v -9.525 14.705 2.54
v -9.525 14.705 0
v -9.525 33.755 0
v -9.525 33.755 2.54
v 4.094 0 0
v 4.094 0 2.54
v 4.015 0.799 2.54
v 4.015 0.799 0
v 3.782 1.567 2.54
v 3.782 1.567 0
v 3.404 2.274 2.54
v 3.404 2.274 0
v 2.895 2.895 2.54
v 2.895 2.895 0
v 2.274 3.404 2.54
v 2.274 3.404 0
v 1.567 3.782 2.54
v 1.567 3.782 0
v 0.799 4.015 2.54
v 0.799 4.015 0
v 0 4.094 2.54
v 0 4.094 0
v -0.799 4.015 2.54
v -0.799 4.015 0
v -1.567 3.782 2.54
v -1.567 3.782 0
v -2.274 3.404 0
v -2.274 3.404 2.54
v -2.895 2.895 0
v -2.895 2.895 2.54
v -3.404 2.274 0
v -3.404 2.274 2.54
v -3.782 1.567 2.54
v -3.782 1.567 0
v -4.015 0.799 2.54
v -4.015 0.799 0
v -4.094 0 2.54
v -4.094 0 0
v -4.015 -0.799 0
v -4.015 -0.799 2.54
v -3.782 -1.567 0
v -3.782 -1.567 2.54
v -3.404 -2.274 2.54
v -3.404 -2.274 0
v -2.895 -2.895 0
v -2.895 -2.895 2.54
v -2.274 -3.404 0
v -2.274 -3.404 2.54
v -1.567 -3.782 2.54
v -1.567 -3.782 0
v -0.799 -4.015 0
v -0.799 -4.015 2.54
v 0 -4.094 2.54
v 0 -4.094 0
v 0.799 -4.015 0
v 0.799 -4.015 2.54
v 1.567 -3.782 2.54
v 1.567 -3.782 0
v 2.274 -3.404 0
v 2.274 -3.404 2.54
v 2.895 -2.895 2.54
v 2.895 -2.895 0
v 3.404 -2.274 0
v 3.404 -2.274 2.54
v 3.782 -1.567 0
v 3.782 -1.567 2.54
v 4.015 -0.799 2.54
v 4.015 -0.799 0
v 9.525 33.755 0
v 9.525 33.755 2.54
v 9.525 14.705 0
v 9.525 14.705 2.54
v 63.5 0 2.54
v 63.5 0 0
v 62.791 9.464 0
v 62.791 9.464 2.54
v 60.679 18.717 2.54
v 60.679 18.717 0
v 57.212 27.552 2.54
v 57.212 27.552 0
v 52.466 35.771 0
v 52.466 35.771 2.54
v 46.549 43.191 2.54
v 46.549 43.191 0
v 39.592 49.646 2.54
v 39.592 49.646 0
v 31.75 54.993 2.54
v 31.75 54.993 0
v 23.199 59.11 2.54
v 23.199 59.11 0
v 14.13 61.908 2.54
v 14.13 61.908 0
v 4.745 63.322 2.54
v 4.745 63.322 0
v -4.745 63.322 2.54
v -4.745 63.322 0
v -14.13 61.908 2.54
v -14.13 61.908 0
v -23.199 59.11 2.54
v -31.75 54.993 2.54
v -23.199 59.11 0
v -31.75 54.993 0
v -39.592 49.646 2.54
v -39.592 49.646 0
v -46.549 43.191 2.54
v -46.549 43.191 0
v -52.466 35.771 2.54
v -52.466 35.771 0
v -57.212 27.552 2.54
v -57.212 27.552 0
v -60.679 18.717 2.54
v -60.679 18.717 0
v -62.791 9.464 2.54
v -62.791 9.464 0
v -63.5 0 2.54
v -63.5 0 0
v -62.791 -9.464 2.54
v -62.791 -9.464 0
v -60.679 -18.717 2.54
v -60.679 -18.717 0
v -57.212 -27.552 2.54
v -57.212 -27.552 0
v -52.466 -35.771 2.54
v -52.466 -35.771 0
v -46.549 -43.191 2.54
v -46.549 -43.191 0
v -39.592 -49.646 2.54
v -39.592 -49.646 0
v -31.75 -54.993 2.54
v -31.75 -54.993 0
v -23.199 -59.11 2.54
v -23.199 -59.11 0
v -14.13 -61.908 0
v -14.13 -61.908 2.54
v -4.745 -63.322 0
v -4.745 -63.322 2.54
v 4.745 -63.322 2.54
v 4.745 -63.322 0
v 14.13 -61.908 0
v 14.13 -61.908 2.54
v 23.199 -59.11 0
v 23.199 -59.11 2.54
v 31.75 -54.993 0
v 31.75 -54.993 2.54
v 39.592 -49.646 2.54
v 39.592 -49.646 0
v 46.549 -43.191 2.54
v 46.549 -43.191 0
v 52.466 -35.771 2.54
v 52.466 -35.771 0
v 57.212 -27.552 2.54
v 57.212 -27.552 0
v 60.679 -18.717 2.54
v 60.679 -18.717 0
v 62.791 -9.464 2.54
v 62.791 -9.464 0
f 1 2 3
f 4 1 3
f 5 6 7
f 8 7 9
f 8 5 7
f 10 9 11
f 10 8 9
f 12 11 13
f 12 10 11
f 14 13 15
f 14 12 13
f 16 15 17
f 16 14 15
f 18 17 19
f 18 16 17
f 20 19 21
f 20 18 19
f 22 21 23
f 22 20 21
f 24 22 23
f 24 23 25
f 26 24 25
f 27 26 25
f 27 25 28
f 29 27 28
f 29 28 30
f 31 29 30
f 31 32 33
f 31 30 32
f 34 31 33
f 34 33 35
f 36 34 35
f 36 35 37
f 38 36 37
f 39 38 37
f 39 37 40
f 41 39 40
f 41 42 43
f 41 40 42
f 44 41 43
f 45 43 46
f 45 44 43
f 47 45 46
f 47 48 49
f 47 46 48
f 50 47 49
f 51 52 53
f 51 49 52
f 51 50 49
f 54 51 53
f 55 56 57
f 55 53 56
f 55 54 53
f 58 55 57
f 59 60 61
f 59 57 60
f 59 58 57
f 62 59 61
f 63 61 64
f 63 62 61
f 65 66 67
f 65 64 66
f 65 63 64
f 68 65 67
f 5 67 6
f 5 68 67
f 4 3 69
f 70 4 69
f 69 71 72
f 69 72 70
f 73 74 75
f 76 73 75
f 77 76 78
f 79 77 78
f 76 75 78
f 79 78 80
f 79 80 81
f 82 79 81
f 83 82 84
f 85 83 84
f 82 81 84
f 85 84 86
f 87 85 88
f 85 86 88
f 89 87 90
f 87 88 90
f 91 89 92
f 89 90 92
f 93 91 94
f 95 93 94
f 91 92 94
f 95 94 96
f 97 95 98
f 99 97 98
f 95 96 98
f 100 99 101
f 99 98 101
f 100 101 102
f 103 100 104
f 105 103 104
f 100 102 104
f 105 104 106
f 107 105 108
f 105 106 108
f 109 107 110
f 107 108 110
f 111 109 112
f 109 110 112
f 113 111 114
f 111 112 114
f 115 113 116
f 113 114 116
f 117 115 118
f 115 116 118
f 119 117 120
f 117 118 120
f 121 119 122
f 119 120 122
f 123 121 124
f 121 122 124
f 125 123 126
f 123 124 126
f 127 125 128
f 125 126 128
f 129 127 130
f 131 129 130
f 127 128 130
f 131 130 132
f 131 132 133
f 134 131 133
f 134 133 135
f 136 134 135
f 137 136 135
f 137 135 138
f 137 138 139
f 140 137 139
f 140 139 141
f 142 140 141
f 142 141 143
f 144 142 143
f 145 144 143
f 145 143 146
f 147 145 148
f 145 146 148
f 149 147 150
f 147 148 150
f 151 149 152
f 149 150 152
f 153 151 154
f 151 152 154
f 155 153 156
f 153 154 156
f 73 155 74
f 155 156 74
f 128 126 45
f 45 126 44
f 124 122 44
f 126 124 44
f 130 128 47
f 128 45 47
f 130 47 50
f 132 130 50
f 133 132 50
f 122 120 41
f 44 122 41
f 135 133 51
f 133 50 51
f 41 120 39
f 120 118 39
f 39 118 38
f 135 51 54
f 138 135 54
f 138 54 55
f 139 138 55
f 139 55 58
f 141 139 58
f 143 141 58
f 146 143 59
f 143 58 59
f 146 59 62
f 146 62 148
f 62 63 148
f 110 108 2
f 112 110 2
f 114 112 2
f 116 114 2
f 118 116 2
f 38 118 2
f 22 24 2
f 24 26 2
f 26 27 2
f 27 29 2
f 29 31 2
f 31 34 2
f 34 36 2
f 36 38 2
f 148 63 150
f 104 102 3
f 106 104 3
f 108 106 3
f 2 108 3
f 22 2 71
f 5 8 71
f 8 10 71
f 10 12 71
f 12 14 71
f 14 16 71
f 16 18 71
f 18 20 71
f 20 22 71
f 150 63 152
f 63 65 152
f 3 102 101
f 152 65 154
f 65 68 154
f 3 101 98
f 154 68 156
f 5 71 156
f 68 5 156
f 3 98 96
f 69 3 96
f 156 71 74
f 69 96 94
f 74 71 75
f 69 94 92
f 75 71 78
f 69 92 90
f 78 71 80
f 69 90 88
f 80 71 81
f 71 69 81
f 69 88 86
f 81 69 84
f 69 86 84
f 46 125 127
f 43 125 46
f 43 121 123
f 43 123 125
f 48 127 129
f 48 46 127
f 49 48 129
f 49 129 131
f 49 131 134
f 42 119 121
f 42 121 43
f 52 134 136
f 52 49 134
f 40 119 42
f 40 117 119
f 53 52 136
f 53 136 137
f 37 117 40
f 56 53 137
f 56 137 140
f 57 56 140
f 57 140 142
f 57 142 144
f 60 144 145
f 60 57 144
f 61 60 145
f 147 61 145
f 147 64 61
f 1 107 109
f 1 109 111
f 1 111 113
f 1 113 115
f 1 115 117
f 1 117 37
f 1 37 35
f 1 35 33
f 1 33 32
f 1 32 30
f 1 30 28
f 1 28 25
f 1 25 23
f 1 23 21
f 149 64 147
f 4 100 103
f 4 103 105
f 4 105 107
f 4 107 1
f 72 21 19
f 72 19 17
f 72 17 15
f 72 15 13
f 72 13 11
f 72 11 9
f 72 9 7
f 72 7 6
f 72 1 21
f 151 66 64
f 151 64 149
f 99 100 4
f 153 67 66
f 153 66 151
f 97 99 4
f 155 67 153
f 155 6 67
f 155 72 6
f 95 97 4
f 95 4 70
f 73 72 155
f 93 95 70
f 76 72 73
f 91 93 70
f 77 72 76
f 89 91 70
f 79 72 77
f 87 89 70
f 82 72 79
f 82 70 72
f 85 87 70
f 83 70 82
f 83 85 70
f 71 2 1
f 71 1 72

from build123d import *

# Parameters (mm, degrees)
F0_R     = 63.5
F1_DEPTH = 2.54
F2_R     = 4.09365
F3_DEPTH = 25.4
F4_DEPTH = 25.4
F5_W     = 19.05
F5_H     = 19.05
F6_DEPTH = 25.4


with BuildPart() as f1:
    # F0 (on Top) → F1 (new body)
    with BuildSketch(Plane.XY):
        Circle(F0_R)
    extrude(amount=F1_DEPTH)

    # F2 (on Top) → F3 (cut)
    with BuildSketch(Plane.XY):
        Circle(F2_R)
    extrude(amount=-F3_DEPTH, mode=Mode.SUBTRACT)

    # F2 (on Top) → F4 (cut)
    with BuildSketch(Plane.XY):
        Circle(F2_R)
    extrude(amount=F4_DEPTH, mode=Mode.SUBTRACT)

    # F5 (on Top) → F6 (cut)
    with BuildSketch(Plane.XY):
        with Locations((0, 24.230285)):
            Rectangle(F5_W, F5_H)
    extrude(amount=F6_DEPTH, mode=Mode.SUBTRACT)


solid = f1.part
